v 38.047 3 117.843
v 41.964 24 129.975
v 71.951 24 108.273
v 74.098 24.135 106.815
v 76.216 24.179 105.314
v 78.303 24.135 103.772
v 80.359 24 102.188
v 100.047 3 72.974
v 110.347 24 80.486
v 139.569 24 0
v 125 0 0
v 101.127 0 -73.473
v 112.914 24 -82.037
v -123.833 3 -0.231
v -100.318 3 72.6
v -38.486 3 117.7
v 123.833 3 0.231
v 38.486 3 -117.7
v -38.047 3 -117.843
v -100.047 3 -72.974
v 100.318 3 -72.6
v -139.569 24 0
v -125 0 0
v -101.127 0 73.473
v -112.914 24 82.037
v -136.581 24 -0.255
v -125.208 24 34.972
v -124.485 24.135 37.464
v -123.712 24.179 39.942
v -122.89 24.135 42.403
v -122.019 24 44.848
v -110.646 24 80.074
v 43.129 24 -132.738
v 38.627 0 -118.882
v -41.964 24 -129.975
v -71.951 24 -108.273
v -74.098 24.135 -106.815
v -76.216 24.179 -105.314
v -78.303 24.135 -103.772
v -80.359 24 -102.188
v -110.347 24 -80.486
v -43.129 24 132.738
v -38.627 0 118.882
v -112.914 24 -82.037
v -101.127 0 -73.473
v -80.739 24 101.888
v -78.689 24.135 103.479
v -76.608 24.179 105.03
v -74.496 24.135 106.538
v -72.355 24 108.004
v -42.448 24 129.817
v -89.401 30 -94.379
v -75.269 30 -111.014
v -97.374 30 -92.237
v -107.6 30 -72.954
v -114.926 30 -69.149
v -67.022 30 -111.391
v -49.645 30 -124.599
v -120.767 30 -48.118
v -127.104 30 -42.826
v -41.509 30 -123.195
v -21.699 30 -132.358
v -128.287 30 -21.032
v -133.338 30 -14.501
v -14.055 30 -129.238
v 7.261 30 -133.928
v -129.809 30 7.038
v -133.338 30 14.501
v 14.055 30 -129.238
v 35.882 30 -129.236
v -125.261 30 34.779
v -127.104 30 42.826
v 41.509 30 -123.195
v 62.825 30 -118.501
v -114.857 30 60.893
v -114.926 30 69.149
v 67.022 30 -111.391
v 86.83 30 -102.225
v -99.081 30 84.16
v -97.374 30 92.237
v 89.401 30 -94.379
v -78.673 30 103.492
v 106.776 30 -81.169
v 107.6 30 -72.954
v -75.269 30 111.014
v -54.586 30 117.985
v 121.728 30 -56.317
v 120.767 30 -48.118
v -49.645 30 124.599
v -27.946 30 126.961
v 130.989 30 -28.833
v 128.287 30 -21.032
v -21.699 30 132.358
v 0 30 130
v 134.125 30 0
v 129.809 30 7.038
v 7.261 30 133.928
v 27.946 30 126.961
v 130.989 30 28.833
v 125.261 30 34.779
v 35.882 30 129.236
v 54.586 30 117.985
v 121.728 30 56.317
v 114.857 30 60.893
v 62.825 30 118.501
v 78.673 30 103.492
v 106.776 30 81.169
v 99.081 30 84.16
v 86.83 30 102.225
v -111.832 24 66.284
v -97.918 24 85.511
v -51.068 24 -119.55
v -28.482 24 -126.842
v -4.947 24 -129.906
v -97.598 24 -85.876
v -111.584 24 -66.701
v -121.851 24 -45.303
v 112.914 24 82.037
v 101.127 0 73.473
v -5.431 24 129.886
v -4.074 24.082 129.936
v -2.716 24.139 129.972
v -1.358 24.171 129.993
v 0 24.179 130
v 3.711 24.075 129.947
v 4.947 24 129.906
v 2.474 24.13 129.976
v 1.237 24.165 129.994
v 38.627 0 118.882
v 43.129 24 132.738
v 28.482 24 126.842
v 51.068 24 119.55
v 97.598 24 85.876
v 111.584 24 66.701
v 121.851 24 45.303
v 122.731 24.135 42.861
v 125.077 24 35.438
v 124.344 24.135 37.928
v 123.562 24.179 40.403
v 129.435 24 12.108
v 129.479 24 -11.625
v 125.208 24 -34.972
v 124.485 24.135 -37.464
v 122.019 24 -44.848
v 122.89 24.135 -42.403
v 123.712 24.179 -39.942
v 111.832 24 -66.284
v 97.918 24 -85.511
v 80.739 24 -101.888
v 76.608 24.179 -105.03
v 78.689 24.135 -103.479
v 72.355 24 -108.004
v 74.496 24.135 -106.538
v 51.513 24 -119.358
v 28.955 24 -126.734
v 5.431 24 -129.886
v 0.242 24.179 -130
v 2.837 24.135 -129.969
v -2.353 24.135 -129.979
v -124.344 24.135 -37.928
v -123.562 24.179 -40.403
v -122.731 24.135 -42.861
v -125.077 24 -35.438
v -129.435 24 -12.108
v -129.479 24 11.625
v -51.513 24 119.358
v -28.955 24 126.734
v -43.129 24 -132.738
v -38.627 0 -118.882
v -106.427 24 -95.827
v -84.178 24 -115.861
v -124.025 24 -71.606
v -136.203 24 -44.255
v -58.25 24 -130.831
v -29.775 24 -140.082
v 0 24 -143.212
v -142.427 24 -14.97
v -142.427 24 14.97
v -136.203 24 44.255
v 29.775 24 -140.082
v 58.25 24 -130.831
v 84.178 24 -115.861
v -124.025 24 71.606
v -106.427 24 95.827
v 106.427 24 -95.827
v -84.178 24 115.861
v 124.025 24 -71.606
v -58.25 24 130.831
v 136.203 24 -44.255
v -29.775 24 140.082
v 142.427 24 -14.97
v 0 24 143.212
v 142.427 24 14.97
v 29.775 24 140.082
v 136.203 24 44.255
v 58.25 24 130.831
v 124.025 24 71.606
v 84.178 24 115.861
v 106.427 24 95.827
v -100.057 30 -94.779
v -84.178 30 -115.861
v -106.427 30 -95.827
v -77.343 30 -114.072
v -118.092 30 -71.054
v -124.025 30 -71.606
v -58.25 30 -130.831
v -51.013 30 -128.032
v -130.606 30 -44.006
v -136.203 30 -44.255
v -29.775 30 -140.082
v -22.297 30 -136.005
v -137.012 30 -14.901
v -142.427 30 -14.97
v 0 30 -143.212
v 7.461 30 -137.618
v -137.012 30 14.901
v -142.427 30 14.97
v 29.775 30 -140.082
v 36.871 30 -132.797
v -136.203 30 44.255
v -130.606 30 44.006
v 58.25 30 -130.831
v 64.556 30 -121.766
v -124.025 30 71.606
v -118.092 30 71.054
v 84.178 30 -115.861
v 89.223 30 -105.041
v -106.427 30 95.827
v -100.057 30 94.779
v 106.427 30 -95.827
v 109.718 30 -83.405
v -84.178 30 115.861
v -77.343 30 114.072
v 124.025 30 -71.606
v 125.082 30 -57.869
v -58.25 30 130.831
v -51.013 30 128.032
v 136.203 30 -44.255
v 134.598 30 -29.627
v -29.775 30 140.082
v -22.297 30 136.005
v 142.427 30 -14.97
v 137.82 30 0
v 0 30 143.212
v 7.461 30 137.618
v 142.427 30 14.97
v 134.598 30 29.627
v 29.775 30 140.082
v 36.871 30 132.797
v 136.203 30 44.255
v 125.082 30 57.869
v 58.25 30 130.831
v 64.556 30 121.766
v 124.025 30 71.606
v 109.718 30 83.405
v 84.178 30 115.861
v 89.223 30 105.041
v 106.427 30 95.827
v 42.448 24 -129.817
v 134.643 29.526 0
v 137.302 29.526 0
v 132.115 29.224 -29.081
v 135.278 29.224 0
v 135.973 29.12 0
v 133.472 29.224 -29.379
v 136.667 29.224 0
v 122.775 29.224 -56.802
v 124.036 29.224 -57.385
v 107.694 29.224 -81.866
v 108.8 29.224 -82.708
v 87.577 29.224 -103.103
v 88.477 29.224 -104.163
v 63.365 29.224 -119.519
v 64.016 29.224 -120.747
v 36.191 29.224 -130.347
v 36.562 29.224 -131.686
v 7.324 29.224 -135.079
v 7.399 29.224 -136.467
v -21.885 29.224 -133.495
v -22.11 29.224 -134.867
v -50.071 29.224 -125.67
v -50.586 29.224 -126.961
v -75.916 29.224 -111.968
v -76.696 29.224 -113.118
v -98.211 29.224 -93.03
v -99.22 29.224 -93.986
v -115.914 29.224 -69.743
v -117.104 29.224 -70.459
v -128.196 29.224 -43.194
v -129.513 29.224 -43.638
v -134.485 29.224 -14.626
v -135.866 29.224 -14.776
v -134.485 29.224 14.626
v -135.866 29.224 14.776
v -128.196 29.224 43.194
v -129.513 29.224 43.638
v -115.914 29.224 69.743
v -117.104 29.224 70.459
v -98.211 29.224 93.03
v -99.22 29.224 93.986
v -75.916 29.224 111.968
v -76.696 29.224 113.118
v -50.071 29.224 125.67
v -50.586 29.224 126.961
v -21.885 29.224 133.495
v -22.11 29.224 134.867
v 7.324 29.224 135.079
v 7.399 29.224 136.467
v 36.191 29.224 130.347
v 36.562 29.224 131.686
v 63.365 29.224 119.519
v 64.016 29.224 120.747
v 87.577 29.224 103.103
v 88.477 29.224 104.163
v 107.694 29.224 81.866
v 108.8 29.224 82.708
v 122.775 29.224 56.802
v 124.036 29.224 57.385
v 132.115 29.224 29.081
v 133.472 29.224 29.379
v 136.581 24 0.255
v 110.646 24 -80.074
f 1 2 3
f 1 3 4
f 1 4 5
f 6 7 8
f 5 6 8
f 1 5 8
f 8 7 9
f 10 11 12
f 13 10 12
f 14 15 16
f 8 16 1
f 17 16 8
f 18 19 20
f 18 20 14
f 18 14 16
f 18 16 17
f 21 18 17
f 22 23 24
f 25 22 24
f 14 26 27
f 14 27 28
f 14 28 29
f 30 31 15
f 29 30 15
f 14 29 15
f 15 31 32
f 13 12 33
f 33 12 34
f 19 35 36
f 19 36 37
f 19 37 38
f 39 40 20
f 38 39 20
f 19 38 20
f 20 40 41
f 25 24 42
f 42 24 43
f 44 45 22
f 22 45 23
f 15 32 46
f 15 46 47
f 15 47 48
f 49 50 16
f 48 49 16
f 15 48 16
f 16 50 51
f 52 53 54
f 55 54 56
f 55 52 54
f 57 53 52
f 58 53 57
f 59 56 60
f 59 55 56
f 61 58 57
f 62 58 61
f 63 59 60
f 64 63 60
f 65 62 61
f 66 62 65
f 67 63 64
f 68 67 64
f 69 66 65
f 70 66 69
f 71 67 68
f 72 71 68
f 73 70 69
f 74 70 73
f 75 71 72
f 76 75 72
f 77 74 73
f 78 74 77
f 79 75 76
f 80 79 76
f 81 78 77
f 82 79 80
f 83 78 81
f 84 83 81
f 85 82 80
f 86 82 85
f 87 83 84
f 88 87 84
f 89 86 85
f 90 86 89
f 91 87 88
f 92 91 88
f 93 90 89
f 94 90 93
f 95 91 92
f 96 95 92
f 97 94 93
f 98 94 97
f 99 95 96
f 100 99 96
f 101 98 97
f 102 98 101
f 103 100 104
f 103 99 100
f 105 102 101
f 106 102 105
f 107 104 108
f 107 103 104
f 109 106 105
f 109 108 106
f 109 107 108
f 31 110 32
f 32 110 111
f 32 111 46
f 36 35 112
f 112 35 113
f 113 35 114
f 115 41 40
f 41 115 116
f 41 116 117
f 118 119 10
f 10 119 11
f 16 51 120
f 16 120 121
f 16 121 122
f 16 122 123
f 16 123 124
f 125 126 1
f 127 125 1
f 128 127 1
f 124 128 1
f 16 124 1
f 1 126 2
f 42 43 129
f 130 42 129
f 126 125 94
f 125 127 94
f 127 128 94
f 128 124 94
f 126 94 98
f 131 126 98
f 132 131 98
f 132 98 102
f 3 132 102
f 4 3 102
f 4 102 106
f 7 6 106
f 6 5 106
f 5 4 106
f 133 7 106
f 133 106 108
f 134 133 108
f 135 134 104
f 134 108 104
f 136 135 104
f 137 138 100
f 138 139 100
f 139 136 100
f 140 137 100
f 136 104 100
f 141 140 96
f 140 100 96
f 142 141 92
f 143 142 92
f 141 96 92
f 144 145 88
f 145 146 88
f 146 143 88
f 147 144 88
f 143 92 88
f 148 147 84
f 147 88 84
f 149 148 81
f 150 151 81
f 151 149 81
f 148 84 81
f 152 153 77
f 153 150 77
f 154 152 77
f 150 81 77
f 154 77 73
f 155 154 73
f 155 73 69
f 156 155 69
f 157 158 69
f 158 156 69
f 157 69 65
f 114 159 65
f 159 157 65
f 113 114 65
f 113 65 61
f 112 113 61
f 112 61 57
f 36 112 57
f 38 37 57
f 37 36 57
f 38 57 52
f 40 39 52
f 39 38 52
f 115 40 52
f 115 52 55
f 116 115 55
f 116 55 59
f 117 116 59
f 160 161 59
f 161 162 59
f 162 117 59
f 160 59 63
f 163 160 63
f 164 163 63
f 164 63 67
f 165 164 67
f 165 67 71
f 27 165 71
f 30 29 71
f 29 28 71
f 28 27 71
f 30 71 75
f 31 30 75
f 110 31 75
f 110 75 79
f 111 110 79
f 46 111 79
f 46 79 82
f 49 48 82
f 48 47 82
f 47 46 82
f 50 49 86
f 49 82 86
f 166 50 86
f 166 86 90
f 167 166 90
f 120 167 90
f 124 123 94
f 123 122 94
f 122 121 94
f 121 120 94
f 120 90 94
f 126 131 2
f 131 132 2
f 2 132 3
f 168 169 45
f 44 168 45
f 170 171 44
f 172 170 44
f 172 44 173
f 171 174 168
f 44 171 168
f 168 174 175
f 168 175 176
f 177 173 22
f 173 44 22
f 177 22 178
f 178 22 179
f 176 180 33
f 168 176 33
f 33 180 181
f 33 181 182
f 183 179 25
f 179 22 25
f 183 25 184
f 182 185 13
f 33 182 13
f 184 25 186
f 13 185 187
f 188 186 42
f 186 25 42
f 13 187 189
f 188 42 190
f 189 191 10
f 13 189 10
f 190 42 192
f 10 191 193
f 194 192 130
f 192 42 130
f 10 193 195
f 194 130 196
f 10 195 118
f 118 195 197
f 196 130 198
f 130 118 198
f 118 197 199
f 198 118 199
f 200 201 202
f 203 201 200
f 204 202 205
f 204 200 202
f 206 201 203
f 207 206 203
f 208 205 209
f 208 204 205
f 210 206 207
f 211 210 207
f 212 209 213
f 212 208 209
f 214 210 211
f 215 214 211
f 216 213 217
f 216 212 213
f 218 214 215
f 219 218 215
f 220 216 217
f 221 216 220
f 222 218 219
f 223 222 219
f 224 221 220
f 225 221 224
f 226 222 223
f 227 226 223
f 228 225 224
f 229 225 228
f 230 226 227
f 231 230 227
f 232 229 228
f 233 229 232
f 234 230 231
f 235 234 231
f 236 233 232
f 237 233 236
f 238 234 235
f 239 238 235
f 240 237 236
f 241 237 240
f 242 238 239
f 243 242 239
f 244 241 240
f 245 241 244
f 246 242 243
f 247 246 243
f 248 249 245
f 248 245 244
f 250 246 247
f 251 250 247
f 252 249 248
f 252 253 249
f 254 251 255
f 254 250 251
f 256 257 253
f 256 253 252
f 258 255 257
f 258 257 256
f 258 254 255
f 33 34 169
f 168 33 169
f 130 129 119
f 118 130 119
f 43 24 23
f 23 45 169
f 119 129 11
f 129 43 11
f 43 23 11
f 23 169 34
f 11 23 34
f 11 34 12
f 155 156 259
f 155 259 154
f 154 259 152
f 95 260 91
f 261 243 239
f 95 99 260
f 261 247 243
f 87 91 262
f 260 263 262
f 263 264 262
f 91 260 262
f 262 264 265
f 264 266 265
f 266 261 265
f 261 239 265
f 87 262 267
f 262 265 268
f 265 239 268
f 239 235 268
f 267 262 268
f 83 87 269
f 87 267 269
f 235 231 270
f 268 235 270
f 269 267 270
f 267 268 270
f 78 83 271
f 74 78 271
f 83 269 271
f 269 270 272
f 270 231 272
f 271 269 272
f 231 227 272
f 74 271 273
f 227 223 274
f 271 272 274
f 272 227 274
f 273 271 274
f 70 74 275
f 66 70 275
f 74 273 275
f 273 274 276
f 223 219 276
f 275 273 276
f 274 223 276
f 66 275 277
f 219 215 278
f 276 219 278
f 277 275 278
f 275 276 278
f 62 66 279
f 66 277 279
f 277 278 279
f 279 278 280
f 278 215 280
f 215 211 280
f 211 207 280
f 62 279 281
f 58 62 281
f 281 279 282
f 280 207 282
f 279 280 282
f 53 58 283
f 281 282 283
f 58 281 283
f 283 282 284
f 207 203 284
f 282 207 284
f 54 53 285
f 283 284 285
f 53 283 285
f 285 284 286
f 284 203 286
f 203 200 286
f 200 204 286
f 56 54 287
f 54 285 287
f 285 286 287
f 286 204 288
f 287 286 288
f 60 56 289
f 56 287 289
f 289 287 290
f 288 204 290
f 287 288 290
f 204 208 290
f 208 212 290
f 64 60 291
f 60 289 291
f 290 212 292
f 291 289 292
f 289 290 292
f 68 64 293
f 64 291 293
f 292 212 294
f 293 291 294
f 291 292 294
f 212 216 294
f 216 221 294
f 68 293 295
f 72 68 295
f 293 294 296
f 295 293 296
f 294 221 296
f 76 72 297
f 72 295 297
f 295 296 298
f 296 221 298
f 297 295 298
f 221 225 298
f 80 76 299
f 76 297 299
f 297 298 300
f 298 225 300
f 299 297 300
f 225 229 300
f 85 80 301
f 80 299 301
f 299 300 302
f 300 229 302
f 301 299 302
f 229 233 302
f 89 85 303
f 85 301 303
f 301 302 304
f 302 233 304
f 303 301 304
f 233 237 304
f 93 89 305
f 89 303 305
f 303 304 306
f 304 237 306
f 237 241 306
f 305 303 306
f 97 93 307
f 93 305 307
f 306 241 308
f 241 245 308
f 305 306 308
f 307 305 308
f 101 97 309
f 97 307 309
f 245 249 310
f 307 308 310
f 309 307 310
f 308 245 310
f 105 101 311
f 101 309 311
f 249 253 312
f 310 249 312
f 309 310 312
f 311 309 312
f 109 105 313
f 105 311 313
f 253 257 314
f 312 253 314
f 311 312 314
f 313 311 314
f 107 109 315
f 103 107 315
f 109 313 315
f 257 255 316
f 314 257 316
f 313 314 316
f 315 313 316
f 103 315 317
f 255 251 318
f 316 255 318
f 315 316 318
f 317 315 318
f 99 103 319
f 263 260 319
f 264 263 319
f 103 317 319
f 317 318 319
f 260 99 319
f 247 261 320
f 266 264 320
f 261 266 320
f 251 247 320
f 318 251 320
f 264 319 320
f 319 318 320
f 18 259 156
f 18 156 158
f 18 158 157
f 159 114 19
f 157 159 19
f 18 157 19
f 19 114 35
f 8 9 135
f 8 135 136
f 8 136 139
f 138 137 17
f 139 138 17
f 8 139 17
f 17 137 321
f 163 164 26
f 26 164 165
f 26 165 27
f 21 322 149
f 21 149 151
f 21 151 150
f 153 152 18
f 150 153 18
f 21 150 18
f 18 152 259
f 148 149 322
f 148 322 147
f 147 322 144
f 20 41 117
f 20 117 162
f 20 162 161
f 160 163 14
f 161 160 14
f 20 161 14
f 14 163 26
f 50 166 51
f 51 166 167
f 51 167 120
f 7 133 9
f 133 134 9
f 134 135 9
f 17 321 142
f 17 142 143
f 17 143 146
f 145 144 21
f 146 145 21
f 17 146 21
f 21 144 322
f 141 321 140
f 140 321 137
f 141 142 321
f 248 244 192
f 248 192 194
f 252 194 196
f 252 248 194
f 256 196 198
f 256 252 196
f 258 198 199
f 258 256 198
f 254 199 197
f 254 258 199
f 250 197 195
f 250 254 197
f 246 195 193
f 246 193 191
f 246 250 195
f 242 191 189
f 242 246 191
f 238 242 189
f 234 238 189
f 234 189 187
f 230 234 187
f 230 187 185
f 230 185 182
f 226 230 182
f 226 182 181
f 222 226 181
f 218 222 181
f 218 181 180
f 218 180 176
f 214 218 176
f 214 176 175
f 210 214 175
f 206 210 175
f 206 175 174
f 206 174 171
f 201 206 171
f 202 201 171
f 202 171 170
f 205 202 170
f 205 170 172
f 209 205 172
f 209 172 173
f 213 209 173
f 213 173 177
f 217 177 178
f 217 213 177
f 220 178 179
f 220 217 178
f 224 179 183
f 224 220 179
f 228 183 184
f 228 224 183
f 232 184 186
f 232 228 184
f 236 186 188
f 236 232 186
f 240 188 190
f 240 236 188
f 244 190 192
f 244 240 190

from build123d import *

# Parameters (mm, degrees)
STAGE1EX_DEPTH      = 30
STAGE1EX_DRAFT      = -30
STAGE1IN_DEPTH      = 27
STAGE1IN_DRAFT      = -30
SKETCH8_R           = 143.211859946
SKETCH8_R_2         = 130
BOSS_EXTRUDE2_DEPTH = 6
SKETCH15_R          = 2.38


with BuildPart() as part:
    # Sketch4 → Stage1Ex (with draft: the straight prism first)
    with BuildSketch(Plane(origin=(0, 0, 0), x_dir=(1, 0, 0), z_dir=(0, 1, 0))):
        Polygon((38.627124297, -118.882064537), (101.127124297, -73.473156537), (125, 0), (101.127124297, 73.473156537), (38.627124297, 118.882064537), (-38.627124297, 118.882064537), (-101.127124297, 73.473156537), (-125, 0), (-101.127124297, -73.473156537), (-38.627124297, -118.882064537), align=None)
    extrude(amount=STAGE1EX_DEPTH)
    # Stage1Ex: the draft: its side faces are tilted about the plane it starts from
    stage1ex_sides = [part.faces().sort_by_distance(p)[0] for p in [
        (69.877124297, 15, 96.177610537),
        (113.063562148, 15, 36.736578268),
        (113.063562148, 15, -36.736578268),
        (69.877124297, 15, -96.177610537),
        (0, 15, -118.882064537),
        (-69.877124297, 15, -96.177610537),
        (-113.063562148, 15, -36.736578268),
        (-113.063562148, 15, 36.736578268),
        (-69.877124297, 15, 96.177610537),
        (0, 15, 118.882064537),
    ]]
    draft(stage1ex_sides, Plane(origin=(0, 0, 0), x_dir=(1, 0, 0), z_dir=(0, 1, 0)), STAGE1EX_DRAFT)


with BuildPart() as stage1in_tool:
    # Sketch7 → Stage1In (with draft: the straight prism first)
    with BuildSketch(Plane(origin=(0, 30, 0), x_dir=(1, 0, 0), z_dir=(0, 1, 0))):
        Polygon((-140.223274297, 0.261449456), (-113.596688048, -82.209655607), (-43.580027974, -133.279466431), (43.082721556, -133.441051082), (113.289335779, -82.632689713), (140.223274297, -0.261449456), (113.596688048, 82.209655607), (43.580027974, 133.279466431), (-43.082721556, 133.441051082), (-113.289335779, 82.632689713), align=None)
    extrude(amount=-STAGE1IN_DEPTH)
    # Stage1In: the draft: its side faces are tilted about the plane it starts from
    stage1in_sides = [stage1in_tool.faces().sort_by_distance(p)[0] for p in [
        (-126.909981172, 16.5, 40.974103075),
        (-78.588358011, 16.5, 107.744561019),
        (-0.248653209, 16.5, 133.360258757),
        (78.186028667, 16.5, 108.036870397),
        (126.756305038, 16.5, 41.447069585),
        (126.909981172, 16.5, -40.974103075),
        (78.588358011, 16.5, -107.744561019),
        (0.248653209, 16.5, -133.360258757),
        (-78.186028667, 16.5, -108.036870397),
        (-126.756305038, 16.5, -41.447069585),
    ]]
    draft(stage1in_sides, Plane(origin=(0, 30, 0), x_dir=(1, 0, 0), z_dir=(0, 1, 0)), STAGE1IN_DRAFT)


with BuildPart() as part_1:
    add(part.part)

    # Stage1In: cut by stage1in_tool
    add(stage1in_tool.part, mode=Mode.SUBTRACT)

    # Sketch8 → Boss-Extrude2 (add)
    with BuildSketch(Plane(origin=(0, 30, 0), x_dir=(1, 0, 0), z_dir=(0, 1, 0))):
        with Locations(Location((0, 0, 0), (0, 0, 270))):
            Circle(SKETCH8_R)
        with Locations(Location((0, 0, 0), (0, 0, 270))):
            Circle(SKETCH8_R_2, mode=Mode.SUBTRACT)
    extrude(amount=-BOSS_EXTRUDE2_DEPTH)

    # Cut-Sweep1: sweep along a path in Sketch14
    with BuildLine(Plane(origin=(0, 30, 0), x_dir=(1, 0, 0), z_dir=(0, 1, 0))) as cut_sweep1_path:
        CenterArc((0, 0), 136, 0, 360)
    # Sketch15 → Cut-Sweep1 (sweep, cut)
    with BuildSketch(Plane(origin=(0, 0, 0), x_dir=(-0.9999982617823745, 0, -0.0018645193026112638), z_dir=(0.0018645193026112638, 0, -0.9999982617823745))):
        with Locations((-135.972501612, 31.5)):
            Circle(SKETCH15_R)
    sweep(path=cut_sweep1_path.line, mode=Mode.SUBTRACT)


solid = part_1.part
